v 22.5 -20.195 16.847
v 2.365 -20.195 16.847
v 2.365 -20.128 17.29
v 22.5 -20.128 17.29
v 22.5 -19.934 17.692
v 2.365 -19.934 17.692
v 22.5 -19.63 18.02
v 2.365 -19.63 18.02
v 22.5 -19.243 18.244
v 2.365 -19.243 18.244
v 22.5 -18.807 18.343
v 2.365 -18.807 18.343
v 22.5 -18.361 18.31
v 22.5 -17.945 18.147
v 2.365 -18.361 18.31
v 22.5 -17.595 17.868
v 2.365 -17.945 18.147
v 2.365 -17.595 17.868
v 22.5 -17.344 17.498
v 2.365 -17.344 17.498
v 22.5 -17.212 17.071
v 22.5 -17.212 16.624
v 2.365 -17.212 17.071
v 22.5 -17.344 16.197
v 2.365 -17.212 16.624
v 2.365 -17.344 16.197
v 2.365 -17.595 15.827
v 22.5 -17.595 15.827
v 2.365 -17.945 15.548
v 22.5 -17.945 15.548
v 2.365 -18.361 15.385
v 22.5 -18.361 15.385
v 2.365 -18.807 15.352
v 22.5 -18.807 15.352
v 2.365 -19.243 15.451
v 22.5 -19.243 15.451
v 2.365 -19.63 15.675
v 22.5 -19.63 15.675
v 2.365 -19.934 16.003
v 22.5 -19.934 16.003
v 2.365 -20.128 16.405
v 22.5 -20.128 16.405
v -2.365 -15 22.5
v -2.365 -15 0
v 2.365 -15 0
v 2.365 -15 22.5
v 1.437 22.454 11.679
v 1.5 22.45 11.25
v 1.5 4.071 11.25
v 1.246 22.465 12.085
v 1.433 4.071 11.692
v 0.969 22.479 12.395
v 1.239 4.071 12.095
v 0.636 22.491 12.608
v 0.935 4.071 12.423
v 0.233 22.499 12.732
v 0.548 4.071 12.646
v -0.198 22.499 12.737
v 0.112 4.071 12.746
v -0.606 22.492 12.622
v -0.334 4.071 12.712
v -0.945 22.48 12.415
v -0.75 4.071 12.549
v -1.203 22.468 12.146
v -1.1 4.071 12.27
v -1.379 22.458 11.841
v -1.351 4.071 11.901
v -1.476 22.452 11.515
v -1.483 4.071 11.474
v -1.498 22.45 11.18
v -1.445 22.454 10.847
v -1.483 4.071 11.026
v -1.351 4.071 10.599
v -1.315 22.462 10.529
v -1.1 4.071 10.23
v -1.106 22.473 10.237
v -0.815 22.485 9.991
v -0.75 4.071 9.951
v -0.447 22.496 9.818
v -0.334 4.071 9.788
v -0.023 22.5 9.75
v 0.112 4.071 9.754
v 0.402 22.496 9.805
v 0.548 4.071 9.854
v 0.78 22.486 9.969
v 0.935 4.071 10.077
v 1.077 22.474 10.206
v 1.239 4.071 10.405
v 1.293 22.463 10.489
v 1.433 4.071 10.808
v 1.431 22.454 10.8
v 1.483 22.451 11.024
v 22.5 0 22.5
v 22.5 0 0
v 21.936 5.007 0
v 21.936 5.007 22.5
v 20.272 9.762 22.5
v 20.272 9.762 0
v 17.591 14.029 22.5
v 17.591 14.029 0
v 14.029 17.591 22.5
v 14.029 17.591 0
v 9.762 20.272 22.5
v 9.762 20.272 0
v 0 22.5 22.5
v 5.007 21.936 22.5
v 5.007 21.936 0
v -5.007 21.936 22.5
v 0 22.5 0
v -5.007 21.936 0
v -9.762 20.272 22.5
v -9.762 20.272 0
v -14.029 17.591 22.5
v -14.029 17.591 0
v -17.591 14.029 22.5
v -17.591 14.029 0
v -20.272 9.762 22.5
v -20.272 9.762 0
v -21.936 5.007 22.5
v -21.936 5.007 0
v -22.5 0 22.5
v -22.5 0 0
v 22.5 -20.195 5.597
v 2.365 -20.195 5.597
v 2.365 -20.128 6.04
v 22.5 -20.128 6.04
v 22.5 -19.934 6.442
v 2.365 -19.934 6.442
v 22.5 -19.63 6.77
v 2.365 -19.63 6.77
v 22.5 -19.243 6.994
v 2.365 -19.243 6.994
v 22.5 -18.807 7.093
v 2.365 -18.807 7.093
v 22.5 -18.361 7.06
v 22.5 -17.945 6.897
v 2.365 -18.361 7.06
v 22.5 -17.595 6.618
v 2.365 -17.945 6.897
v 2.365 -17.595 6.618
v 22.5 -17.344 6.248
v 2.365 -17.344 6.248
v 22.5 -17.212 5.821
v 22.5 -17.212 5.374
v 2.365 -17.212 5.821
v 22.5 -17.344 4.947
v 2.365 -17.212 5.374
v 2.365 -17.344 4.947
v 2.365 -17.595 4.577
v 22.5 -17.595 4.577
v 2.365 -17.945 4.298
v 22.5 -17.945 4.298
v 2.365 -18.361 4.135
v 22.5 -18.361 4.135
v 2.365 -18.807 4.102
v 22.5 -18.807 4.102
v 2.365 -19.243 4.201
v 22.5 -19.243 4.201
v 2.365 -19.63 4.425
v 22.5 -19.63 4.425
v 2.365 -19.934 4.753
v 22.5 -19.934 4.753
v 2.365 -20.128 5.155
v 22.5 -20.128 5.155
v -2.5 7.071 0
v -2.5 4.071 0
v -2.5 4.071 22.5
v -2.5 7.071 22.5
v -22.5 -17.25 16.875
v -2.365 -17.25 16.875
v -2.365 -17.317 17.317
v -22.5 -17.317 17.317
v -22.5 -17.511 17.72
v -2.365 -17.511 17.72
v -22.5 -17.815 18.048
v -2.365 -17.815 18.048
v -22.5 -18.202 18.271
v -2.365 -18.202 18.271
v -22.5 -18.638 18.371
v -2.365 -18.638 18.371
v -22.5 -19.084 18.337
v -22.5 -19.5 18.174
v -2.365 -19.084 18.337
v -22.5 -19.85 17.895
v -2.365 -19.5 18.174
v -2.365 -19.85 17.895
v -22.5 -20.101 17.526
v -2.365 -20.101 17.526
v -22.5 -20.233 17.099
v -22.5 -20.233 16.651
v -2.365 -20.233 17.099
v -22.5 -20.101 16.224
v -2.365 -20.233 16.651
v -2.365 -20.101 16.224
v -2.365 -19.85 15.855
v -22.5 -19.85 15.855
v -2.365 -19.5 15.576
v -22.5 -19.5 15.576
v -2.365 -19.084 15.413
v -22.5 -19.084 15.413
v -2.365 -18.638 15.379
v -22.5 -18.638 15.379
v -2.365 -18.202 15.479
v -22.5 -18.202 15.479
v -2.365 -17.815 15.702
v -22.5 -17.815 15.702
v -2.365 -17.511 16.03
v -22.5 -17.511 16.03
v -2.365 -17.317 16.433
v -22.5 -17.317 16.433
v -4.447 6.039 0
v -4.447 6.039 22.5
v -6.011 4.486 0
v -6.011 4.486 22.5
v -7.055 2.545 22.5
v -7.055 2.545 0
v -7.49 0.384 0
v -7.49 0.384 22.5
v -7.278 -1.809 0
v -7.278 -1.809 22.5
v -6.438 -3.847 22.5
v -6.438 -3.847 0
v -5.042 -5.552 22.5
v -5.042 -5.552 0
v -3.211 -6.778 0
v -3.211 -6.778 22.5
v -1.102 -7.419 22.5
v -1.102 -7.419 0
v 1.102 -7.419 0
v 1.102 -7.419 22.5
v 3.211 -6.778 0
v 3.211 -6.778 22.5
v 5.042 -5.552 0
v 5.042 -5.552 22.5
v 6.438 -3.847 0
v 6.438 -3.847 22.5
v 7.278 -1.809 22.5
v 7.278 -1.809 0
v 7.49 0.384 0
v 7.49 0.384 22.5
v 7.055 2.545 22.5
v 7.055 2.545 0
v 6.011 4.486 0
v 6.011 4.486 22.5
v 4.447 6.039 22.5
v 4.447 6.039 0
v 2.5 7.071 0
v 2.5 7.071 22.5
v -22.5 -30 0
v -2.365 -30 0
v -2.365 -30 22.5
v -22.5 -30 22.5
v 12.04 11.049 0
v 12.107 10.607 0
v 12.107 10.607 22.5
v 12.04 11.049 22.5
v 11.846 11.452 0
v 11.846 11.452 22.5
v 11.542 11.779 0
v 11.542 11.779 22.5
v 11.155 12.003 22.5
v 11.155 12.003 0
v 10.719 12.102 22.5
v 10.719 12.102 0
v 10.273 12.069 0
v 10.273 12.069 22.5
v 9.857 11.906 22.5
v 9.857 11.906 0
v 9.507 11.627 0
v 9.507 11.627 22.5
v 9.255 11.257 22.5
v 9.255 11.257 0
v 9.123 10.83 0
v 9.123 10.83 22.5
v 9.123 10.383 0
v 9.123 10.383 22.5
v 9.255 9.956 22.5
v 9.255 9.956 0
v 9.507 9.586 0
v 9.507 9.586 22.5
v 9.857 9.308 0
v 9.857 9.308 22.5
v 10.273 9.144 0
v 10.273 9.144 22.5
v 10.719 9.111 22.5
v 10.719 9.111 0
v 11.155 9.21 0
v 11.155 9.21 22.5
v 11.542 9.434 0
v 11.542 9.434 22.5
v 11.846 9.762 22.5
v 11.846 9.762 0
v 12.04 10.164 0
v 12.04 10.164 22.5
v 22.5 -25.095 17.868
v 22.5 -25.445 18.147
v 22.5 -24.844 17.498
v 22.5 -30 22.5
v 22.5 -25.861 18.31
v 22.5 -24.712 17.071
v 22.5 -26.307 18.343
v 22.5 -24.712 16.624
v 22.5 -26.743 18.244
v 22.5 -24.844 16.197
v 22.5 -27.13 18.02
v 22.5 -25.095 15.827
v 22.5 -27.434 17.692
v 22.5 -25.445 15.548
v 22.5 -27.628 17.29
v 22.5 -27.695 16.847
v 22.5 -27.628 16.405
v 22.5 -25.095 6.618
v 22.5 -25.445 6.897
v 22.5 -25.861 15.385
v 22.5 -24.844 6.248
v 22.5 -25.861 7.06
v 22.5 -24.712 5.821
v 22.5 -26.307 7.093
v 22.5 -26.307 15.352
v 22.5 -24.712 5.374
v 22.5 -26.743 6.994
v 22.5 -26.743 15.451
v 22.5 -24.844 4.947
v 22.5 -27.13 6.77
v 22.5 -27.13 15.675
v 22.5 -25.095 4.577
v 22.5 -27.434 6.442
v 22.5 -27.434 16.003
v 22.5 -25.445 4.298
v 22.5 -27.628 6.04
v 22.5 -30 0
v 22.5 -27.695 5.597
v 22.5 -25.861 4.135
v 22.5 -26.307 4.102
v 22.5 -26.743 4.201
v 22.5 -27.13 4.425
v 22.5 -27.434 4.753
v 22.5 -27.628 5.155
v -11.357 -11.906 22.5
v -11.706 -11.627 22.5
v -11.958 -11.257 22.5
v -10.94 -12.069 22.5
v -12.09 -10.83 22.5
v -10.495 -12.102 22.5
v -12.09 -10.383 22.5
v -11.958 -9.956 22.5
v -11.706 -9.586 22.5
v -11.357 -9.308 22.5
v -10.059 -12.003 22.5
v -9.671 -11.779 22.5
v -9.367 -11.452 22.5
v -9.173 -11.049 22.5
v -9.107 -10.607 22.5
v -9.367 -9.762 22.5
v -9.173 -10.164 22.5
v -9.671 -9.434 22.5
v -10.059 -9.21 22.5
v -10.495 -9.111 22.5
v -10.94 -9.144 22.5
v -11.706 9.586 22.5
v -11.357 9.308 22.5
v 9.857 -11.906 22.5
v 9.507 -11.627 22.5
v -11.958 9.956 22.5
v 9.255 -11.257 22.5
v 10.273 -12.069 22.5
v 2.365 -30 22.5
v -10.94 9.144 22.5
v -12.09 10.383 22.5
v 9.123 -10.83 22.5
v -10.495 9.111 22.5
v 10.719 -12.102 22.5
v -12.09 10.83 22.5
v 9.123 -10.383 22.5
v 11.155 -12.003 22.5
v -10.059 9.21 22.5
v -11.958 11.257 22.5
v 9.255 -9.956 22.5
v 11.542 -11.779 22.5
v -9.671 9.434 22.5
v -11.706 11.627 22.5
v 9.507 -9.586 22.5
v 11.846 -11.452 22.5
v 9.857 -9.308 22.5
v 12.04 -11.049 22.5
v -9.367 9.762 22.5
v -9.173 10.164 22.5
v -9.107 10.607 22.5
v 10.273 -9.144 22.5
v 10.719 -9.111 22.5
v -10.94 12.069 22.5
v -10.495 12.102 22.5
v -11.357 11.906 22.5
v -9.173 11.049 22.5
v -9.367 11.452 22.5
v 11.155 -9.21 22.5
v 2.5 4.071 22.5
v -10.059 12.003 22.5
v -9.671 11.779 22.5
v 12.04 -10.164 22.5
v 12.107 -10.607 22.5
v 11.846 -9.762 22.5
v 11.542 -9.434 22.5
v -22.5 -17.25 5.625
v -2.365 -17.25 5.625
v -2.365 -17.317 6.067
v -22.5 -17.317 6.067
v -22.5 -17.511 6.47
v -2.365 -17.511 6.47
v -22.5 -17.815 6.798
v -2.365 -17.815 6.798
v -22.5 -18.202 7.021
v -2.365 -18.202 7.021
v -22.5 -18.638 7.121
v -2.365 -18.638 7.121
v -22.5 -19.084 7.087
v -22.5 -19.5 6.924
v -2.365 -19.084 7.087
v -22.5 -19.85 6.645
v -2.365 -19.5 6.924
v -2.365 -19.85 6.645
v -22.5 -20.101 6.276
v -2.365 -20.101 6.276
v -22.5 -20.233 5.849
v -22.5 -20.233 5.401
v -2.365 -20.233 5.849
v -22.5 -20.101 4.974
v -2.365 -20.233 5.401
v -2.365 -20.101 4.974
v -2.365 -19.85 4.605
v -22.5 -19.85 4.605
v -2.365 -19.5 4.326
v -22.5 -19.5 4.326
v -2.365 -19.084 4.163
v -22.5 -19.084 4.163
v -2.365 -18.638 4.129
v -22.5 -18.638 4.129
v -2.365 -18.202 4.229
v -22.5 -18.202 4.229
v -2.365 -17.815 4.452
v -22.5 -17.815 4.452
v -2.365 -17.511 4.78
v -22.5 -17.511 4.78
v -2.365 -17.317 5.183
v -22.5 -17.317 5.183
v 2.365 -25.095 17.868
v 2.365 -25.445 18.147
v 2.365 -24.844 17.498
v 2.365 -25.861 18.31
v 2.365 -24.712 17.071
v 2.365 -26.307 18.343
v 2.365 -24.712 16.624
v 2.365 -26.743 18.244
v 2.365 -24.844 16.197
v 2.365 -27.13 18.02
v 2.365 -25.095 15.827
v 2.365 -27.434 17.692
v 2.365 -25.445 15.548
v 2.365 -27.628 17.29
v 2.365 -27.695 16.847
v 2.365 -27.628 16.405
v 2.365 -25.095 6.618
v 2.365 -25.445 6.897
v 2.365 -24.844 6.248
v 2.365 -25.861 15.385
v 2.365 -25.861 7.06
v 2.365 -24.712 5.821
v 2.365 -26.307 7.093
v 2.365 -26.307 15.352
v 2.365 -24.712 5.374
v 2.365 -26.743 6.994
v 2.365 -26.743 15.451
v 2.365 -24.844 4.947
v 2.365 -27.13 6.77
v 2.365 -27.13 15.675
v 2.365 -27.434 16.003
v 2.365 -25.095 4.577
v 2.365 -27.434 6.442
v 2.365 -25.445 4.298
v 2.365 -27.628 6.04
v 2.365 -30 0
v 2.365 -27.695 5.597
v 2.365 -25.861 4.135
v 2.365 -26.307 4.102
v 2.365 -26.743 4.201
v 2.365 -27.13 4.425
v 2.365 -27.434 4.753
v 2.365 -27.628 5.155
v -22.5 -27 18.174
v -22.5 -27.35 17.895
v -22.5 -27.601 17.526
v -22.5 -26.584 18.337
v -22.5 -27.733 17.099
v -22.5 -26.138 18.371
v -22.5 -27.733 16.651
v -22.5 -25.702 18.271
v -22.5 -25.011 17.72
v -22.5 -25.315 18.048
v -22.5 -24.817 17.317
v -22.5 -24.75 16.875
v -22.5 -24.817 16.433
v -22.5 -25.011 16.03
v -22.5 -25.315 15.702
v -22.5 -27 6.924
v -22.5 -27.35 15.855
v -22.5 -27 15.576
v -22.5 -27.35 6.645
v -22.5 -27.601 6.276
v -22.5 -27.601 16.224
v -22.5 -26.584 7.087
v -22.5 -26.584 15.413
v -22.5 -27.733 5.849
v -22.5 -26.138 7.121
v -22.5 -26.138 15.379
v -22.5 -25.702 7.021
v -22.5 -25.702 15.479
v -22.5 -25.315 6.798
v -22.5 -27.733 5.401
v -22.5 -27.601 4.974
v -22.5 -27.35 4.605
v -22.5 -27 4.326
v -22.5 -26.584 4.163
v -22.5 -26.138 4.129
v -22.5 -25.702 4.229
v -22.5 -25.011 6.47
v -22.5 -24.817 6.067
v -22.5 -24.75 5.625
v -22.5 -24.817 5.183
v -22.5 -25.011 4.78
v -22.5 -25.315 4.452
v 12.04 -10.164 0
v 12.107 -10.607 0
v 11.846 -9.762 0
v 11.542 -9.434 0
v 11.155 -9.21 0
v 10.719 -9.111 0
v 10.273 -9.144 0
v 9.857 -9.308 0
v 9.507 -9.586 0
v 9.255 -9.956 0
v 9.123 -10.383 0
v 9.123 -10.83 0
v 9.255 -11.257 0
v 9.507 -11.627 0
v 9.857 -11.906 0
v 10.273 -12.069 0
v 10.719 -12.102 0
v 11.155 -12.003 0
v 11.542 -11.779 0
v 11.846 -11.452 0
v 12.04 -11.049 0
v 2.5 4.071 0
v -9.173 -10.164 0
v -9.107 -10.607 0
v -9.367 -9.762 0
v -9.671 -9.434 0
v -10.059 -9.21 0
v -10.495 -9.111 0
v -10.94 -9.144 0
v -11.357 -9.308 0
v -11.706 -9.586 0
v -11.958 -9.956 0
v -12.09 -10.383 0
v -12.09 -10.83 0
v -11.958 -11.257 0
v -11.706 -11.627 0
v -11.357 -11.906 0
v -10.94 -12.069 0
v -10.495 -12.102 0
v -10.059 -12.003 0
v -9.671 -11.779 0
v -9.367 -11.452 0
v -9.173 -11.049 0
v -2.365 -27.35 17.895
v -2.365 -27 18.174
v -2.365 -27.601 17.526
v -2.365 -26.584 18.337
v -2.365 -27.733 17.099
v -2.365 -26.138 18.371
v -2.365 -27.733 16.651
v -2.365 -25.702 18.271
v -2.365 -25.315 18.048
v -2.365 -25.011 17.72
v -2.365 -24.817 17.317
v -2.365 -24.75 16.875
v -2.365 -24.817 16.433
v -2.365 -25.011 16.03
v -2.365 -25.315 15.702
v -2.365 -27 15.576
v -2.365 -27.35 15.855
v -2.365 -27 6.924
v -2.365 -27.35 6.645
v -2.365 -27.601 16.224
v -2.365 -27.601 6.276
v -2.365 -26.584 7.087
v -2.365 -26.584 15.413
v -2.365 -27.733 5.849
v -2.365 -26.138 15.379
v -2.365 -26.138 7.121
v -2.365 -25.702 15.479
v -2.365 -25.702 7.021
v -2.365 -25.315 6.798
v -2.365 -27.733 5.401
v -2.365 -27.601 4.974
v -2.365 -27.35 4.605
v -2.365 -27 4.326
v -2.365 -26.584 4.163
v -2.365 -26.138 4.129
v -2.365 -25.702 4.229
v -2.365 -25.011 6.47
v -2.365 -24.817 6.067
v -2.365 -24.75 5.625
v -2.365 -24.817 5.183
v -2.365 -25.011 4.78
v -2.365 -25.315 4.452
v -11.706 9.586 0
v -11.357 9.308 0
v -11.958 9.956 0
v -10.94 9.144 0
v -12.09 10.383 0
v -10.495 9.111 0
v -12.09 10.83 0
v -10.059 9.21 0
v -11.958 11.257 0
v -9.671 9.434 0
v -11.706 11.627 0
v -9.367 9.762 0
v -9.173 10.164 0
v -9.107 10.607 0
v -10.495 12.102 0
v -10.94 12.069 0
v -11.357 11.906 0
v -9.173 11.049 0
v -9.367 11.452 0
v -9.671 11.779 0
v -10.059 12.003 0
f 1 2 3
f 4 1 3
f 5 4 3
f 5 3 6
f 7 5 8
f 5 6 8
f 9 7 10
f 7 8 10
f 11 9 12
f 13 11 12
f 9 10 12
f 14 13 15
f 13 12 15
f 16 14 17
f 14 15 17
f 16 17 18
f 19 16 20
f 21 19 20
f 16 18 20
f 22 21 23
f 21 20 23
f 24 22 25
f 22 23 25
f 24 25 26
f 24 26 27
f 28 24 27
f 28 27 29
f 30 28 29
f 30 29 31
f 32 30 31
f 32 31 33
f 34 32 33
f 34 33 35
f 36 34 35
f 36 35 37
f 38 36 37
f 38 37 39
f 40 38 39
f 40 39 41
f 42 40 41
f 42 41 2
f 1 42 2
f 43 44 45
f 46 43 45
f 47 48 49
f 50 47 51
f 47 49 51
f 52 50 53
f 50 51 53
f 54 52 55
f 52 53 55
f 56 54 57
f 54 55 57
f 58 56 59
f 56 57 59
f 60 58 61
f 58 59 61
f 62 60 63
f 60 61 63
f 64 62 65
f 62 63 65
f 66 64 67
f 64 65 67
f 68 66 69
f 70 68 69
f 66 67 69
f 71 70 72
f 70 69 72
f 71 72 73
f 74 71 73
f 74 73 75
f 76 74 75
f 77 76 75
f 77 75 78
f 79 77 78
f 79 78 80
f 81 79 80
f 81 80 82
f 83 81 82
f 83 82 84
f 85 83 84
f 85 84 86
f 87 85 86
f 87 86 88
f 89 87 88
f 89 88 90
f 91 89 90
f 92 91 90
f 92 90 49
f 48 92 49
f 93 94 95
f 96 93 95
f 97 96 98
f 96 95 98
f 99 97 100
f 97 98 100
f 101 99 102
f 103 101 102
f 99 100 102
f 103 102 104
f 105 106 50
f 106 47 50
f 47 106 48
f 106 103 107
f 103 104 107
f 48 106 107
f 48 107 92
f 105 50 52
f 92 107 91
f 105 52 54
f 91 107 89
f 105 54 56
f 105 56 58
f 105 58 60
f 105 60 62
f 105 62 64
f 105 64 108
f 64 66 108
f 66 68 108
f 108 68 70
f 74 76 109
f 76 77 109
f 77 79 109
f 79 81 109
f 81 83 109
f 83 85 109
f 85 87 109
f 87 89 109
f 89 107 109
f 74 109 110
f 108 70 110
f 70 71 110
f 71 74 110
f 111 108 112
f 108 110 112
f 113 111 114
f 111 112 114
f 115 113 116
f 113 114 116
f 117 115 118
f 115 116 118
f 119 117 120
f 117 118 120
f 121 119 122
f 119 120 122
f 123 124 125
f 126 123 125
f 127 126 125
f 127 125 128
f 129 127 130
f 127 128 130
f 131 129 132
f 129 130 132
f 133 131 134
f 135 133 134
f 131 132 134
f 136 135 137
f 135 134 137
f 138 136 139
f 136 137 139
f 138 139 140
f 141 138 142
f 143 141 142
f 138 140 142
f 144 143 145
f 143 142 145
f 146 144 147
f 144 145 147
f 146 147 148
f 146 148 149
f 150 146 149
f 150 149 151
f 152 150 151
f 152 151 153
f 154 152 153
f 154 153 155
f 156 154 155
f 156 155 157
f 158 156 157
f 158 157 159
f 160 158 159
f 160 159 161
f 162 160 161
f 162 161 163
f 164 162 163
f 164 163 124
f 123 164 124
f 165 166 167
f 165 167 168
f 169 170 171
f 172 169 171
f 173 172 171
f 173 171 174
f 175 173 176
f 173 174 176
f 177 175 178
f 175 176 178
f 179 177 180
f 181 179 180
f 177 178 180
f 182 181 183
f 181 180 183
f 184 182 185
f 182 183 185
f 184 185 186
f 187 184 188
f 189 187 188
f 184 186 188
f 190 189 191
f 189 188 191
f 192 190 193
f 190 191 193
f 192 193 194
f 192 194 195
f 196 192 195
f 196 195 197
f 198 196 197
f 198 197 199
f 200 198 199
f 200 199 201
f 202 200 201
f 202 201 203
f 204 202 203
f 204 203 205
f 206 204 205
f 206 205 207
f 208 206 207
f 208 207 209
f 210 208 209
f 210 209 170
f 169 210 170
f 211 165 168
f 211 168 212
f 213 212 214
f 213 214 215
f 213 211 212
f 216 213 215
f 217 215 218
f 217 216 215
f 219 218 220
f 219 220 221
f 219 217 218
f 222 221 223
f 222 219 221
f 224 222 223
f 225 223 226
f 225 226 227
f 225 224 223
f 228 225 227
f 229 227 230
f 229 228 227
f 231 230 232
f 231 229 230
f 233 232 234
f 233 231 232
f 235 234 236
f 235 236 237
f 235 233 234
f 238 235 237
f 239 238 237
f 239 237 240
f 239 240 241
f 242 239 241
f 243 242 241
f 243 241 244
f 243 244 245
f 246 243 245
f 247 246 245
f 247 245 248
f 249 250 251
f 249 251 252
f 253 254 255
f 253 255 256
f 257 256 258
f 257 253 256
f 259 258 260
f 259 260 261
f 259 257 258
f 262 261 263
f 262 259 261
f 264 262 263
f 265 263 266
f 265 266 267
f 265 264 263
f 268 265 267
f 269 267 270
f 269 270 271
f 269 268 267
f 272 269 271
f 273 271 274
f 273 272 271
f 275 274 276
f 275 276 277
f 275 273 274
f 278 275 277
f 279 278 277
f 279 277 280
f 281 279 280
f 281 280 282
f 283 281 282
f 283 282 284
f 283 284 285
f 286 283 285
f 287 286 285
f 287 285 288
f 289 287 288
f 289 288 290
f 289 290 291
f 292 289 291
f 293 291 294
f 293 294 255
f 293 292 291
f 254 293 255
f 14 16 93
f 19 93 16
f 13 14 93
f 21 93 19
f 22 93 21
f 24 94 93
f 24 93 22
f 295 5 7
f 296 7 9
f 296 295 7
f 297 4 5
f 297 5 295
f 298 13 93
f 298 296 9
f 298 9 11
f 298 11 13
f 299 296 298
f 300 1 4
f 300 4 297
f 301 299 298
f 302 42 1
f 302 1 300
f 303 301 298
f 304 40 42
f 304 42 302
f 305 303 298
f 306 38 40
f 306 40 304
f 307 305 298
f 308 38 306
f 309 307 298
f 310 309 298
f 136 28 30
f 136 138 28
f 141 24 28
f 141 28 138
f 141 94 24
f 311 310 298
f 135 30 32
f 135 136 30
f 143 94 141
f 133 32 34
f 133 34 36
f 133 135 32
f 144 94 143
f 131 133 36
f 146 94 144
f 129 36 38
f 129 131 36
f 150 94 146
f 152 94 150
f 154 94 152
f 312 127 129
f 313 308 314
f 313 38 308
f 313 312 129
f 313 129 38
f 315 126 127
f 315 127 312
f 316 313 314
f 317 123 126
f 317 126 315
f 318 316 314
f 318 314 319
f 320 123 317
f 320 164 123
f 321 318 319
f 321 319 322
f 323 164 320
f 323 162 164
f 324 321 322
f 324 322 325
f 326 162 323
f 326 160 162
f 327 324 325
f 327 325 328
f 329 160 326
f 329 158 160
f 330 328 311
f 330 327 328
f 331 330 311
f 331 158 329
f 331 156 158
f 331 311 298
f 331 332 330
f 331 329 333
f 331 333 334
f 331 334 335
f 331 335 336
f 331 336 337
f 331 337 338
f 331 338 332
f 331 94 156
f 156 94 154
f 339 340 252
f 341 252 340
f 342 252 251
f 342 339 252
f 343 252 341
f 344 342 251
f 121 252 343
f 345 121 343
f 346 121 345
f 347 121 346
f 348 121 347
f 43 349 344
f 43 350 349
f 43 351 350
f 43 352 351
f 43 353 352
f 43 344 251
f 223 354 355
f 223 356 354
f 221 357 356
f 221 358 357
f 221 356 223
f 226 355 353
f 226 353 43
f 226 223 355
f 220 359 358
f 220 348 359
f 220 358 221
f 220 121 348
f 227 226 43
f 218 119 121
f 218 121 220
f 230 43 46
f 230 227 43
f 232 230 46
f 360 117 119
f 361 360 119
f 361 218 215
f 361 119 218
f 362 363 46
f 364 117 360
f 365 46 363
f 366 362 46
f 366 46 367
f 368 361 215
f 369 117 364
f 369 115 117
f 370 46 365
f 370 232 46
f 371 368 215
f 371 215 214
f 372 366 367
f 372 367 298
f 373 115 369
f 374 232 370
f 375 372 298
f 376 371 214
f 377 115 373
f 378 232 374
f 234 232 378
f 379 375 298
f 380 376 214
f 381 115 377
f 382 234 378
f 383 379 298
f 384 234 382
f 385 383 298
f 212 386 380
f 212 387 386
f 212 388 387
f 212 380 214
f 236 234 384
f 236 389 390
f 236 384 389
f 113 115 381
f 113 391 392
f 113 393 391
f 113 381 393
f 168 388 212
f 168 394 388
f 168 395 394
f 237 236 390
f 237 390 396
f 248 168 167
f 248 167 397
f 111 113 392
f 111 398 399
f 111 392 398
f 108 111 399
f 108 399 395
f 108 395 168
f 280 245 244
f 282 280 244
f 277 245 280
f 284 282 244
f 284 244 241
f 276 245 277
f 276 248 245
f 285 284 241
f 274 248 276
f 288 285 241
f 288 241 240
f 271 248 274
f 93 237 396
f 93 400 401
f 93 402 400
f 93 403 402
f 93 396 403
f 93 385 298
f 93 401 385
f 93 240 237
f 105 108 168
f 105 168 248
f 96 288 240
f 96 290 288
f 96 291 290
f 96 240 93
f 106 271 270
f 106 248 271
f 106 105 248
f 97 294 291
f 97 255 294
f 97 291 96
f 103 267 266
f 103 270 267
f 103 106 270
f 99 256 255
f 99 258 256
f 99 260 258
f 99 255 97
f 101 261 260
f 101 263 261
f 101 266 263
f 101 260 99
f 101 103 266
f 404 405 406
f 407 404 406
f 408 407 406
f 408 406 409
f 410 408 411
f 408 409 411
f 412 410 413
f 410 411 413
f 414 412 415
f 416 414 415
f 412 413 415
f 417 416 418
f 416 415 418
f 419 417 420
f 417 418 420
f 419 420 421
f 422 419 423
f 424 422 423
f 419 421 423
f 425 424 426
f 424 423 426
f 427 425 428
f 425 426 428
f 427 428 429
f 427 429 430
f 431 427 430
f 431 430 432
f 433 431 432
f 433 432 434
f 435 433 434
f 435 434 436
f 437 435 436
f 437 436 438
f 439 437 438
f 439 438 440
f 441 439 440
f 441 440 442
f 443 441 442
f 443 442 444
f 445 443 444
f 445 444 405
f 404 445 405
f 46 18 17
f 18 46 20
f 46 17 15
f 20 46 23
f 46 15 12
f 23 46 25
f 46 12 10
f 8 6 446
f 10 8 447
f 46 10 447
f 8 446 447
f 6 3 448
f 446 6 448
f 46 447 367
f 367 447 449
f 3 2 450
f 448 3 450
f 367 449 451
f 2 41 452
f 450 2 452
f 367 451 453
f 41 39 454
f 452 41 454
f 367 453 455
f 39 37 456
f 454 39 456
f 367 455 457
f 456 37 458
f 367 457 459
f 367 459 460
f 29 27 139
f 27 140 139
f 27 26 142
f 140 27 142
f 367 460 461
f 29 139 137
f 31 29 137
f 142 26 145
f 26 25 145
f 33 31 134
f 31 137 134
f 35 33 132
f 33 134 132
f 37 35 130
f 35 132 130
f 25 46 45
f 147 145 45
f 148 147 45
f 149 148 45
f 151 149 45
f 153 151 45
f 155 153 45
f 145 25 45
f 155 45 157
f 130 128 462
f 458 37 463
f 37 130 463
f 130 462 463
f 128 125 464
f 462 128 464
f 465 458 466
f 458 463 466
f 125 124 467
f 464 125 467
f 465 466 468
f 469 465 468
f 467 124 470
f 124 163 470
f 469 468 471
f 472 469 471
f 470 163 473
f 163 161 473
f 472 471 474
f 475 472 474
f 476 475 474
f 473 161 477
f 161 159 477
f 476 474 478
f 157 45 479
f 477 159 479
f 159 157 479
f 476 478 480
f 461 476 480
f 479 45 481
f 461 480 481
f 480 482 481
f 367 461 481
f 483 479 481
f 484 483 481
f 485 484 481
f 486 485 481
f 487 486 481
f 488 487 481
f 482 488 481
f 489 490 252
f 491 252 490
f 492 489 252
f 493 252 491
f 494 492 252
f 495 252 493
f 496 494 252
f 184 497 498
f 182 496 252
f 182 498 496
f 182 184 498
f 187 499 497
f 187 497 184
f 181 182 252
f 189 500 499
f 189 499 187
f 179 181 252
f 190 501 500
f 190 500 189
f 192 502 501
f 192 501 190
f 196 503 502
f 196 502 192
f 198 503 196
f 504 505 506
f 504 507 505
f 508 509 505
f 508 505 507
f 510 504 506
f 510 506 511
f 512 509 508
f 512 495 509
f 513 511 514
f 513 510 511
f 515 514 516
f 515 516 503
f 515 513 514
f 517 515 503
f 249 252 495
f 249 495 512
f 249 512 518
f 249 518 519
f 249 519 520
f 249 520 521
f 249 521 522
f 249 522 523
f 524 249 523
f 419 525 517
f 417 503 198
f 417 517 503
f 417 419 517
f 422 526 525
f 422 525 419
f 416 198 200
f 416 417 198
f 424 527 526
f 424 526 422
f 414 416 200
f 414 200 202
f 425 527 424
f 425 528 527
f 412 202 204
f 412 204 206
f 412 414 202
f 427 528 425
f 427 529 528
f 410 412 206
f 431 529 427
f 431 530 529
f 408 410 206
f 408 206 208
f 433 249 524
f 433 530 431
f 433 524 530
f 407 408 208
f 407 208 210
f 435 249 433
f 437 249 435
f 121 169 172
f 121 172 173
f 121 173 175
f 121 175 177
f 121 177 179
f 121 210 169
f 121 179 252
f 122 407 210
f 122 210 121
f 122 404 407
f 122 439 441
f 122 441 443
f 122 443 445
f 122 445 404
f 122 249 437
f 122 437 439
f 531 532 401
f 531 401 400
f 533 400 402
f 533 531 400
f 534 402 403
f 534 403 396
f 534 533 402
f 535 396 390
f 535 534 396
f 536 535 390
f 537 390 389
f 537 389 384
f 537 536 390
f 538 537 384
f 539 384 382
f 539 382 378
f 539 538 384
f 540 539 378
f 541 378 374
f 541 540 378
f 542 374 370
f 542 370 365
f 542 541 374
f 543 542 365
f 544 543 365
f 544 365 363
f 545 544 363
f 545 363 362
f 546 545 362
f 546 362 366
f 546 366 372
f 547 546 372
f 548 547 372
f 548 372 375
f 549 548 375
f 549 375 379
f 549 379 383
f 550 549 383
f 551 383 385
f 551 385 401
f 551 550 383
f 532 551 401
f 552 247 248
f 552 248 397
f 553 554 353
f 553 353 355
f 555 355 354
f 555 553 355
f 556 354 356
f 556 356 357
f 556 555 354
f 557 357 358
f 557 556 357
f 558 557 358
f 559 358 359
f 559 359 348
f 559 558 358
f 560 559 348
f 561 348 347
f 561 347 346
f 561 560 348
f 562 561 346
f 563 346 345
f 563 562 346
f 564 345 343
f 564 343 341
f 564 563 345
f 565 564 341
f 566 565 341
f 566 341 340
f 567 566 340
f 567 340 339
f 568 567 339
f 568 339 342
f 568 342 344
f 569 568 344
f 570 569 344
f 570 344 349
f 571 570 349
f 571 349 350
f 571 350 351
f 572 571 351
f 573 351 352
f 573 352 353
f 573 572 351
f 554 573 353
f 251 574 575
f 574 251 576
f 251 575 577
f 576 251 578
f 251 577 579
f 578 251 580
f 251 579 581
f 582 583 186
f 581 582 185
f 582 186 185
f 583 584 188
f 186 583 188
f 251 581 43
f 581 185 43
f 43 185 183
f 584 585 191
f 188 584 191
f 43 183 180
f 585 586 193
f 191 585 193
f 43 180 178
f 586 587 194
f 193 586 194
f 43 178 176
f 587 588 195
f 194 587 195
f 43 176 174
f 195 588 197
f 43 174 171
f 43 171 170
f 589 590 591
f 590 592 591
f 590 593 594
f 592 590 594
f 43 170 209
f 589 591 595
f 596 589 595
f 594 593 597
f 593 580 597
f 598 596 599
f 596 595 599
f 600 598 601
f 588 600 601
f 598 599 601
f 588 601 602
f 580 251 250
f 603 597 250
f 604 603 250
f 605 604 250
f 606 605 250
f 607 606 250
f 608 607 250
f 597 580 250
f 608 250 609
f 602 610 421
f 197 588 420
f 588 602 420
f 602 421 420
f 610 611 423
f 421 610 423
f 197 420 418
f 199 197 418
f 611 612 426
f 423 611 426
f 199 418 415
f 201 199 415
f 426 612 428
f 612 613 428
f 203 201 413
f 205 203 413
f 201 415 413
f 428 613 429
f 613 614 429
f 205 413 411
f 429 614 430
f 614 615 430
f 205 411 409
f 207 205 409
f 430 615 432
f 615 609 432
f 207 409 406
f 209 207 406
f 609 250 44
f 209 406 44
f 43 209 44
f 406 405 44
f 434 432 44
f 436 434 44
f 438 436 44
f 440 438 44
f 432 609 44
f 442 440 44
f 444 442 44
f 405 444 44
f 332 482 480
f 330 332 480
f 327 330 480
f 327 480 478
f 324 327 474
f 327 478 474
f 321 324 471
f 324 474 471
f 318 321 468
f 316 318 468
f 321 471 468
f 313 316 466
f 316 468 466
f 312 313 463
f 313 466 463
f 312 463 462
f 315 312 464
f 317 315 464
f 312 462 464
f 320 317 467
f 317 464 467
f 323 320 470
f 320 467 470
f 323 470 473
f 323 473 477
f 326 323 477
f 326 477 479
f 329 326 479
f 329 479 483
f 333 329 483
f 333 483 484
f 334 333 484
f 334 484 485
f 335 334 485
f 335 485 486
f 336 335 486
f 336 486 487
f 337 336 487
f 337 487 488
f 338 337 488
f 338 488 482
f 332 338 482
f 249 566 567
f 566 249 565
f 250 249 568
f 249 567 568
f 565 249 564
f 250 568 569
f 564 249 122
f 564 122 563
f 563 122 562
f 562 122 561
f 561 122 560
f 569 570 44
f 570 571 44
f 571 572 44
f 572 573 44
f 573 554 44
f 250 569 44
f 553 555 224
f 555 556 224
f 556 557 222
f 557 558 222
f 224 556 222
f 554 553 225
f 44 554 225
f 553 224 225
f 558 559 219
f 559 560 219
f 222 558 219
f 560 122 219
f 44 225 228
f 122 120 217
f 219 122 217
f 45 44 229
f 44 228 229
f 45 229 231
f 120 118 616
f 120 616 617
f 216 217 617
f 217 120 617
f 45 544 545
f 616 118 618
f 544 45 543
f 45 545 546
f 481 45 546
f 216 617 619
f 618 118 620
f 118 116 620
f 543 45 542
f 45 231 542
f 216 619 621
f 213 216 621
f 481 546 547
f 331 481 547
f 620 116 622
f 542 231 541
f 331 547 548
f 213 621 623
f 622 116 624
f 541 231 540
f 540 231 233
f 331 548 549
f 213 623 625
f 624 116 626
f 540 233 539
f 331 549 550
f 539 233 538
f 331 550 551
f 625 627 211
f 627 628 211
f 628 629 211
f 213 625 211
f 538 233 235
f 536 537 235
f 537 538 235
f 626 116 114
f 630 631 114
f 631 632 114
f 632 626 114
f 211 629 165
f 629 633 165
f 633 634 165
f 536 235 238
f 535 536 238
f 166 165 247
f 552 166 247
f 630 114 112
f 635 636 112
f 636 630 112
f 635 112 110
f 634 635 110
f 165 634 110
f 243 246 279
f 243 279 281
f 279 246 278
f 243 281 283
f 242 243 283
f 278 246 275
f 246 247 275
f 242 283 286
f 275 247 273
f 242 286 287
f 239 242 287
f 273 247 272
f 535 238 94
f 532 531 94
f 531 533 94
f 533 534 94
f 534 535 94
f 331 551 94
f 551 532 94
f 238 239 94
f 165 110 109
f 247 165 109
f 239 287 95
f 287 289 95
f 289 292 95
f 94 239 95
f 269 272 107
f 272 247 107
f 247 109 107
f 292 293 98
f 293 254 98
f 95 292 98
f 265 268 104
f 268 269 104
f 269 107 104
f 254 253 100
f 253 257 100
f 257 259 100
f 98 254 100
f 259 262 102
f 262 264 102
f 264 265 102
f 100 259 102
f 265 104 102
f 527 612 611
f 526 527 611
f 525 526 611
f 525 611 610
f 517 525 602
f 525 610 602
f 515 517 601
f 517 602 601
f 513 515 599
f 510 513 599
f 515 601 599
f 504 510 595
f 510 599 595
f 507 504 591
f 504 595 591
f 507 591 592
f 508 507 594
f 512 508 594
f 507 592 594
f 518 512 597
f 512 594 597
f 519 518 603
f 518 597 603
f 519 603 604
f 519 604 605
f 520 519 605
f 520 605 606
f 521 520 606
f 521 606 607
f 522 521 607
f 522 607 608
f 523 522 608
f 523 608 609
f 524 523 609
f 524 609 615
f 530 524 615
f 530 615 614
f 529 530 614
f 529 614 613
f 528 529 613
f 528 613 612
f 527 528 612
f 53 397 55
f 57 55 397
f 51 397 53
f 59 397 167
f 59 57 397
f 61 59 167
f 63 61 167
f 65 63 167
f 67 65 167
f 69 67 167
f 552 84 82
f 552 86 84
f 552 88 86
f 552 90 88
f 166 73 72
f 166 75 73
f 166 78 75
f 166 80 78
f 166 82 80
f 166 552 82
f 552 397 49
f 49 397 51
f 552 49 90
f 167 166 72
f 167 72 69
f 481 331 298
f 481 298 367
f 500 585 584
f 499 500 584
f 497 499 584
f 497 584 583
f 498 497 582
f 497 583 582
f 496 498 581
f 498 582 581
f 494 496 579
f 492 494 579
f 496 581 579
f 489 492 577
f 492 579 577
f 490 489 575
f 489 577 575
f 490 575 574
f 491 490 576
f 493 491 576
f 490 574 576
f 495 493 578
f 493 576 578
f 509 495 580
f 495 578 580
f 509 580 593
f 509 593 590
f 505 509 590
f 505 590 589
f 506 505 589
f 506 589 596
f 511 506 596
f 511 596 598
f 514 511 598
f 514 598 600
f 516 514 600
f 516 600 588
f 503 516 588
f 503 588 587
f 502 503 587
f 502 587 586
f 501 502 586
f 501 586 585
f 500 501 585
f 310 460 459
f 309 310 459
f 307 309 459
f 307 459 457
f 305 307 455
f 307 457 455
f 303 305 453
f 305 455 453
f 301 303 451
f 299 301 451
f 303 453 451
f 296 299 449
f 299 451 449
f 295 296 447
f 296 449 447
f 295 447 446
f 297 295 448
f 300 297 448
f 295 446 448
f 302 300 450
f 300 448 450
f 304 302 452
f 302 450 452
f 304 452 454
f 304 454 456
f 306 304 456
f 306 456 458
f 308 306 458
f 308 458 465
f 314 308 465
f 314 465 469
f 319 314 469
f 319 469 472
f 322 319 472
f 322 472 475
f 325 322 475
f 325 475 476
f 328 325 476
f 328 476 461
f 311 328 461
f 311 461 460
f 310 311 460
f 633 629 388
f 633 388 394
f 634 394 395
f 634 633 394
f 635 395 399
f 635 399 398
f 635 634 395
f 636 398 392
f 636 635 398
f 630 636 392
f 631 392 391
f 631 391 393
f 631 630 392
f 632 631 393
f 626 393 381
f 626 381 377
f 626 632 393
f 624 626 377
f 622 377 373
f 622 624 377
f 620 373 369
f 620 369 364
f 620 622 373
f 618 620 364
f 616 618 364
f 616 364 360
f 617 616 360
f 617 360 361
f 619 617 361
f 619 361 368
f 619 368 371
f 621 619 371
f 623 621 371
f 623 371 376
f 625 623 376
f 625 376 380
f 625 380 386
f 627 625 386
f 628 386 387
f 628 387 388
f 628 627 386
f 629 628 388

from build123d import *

# Parameters (mm, degrees)
SKETCH_R        = 1.5
PAD_DEPTH       = 22.5
SKETCH001_R     = 1.5
POCKET_DEPTH    = 18.429932
SKETCH004_R     = 1.5
POCKET001_DEPTH = 20.136
SKETCH005_R     = 1.5
POCKET002_DEPTH = 20.136


with BuildPart() as part:
    # Sketch → Pad (new body)
    with BuildSketch(Plane.XY):
        with BuildLine():
            ThreePointArc((22.5, 0), (0, 22.5), (-22.5, 0))
            Line((-22.5, -30), (-22.5, 0))
            Line((-2.365, -30), (-22.5, -30))
            Line((-2.365, -30), (-2.365, -15))
            Line((-2.365, -15), (2.365, -15))
            Line((2.365, -15), (2.365, -30))
            Line((22.5, -30), (2.365, -30))
            Line((22.5, 0), (22.5, -30))
        make_face()
        with Locations((-10.606602, 10.606602)):
            Circle(SKETCH_R, mode=Mode.SUBTRACT)
        with Locations((-10.606602, -10.606602)):
            Circle(SKETCH_R, mode=Mode.SUBTRACT)
        with Locations((10.606602, -10.606602)):
            Circle(SKETCH_R, mode=Mode.SUBTRACT)
        with Locations((10.606602, 10.606602)):
            Circle(SKETCH_R, mode=Mode.SUBTRACT)
        with BuildLine():
            ThreePointArc((-2.5, 7.071068), (0, -7.5), (2.5, 7.071068))
            Line((2.5, 7.071068), (2.5, 4.071068))
            Line((2.5, 4.071068), (-2.5, 4.071068))
            Line((-2.5, 4.071068), (-2.5, 7.071068))
        make_face(mode=Mode.SUBTRACT)
    extrude(amount=PAD_DEPTH)

    # Sketch001 → Pocket (cut, through all)
    with BuildSketch(Plane.XZ.offset(-4.071068)):
        with Locations((0, 11.25)):
            Circle(SKETCH001_R)
    extrude(amount=-POCKET_DEPTH, mode=Mode.SUBTRACT)

    # Sketch004 → Pocket001 (cut, through all)
    with BuildSketch(Plane.YZ.offset(-2.365)):
        with Locations((-26.25, 16.875)):
            Circle(SKETCH004_R)
        with Locations((-18.75, 16.875)):
            Circle(SKETCH004_R)
        with Locations((-18.75, 5.625)):
            Circle(SKETCH004_R)
        with Locations((-26.25, 5.625)):
            Circle(SKETCH004_R)
    extrude(amount=-POCKET001_DEPTH, mode=Mode.SUBTRACT)

    # Sketch005 → Pocket002 (cut, through all)
    with BuildSketch(Plane(origin=(2.365, 0, 0), x_dir=(0, -1, 0), z_dir=(-1, 0, 0))):
        with Locations((18.694969, 16.847485)):
            Circle(SKETCH005_R)
        with Locations((26.194969, 16.847485)):
            Circle(SKETCH005_R)
        with Locations((18.694969, 5.597485)):
            Circle(SKETCH005_R)
        with Locations((26.194969, 5.597485)):
            Circle(SKETCH005_R)
    extrude(amount=-POCKET002_DEPTH, mode=Mode.SUBTRACT)


solid = part.part
